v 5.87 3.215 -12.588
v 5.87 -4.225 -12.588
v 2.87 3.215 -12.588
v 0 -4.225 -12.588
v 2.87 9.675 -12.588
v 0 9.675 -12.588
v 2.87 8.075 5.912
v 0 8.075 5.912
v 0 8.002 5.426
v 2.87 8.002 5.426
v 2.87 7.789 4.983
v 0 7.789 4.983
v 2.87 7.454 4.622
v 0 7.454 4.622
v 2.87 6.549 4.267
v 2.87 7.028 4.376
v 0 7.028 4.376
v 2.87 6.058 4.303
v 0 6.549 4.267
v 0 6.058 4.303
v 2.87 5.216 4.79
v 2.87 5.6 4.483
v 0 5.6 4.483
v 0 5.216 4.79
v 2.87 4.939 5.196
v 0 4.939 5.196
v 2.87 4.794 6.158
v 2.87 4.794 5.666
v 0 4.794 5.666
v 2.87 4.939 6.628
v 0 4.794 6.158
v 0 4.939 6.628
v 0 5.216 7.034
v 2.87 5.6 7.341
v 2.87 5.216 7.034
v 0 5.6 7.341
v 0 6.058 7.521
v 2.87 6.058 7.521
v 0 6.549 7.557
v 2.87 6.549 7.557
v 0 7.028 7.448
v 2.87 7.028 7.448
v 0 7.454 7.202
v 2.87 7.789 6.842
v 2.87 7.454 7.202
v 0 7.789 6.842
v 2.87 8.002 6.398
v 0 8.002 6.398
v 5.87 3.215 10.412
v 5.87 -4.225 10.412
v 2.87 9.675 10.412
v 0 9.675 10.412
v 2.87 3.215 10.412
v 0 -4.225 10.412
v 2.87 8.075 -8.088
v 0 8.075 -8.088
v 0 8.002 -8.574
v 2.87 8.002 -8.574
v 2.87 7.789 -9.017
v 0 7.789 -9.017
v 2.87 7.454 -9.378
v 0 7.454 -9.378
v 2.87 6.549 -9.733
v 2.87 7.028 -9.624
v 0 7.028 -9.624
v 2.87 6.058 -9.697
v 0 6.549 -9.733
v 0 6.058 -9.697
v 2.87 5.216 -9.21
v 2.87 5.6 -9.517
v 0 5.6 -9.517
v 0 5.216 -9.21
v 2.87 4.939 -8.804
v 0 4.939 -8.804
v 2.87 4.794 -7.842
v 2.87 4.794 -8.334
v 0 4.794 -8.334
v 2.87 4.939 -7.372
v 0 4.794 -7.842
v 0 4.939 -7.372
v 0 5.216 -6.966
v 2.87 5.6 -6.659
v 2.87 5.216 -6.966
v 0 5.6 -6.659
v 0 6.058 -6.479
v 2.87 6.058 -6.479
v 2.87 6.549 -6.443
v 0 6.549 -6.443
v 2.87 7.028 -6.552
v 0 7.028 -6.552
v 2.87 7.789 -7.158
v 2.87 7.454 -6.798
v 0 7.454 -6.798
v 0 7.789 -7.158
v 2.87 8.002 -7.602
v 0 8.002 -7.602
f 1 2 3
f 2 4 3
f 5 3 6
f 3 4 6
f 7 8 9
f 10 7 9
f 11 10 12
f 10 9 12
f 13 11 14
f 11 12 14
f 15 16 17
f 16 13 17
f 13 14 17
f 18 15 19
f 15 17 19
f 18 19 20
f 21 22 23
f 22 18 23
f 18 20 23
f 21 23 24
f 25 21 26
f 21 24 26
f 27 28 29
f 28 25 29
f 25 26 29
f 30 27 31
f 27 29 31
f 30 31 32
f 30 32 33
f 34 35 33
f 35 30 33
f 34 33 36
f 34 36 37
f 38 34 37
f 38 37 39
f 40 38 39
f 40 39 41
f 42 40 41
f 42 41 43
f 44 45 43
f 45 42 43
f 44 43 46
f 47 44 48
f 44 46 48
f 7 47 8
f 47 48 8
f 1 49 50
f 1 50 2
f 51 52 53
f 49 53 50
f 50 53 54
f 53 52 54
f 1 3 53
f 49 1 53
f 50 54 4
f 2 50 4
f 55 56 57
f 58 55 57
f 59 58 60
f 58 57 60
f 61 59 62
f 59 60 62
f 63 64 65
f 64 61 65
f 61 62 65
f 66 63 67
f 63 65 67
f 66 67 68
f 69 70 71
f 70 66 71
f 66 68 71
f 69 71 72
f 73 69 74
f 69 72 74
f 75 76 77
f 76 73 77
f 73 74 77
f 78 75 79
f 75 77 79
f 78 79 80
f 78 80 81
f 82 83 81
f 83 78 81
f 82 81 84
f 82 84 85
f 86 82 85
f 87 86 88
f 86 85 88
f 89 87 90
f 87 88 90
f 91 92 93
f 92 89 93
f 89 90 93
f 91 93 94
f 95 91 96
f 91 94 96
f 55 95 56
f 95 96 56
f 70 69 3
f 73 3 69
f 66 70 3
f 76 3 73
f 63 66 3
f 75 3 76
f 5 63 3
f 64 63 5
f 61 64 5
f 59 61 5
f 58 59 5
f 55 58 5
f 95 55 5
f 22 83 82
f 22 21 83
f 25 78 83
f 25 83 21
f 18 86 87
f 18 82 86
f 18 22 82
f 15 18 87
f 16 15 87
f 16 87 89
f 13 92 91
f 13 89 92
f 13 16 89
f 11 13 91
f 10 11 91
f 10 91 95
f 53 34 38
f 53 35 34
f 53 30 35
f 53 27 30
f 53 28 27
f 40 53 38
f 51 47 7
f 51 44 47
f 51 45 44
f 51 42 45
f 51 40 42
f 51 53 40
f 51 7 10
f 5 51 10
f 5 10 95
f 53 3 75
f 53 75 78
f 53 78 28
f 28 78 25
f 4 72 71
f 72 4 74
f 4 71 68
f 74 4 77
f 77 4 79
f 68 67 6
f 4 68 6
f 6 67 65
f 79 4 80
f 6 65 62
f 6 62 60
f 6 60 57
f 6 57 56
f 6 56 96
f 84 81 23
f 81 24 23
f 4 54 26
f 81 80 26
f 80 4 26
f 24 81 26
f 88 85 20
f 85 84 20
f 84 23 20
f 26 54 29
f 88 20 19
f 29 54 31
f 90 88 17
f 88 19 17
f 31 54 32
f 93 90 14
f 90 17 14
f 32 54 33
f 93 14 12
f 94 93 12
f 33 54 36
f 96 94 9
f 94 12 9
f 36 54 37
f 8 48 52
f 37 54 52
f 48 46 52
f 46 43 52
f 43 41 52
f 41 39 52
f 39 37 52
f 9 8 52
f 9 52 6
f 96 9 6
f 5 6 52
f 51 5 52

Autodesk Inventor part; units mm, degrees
ref_plane "YZ Plane" through (0, 0, 0) normal (1, 0, 0) x (0, 1, 0)
ref_plane "XZ Plane" through (0, 0, 0) normal (0, 1, 0) x (-1, 0, 0)
ref_plane "XY Plane" through (0, 0, 0) normal (0, 0, 1) x (1, 0, 0)
sketch "Sketch1" plane through (0, 0, 0) normal (1, 0, 0) x (0, 1, 0)
  line L0 (9.6754, 10.4121) -> (-4.2246, 10.4121)
  line L1 (-4.2246, 10.4121) -> (-4.2246, -12.5879)
  line L2 (-4.2246, -12.5879) -> (9.6754, -12.5879)
  line L3 (9.6754, -12.5879) -> (9.6754, 10.4121)
  line L4 (9.6754, -1.0879) -> (8.0754, -1.0879) construction
  line L5 (8.0754, -1.0879) -> (8.0754, -8.0879) construction
  line L6 (8.0754, -8.0879) -> (8.0754, 5.9121) construction
  line L7 (8.0754, 5.9121) -> (6.4254, 5.9121) construction
  circle A0 centre (6.4254, 5.9121) radius 1.65
  circle A1 centre (6.4254, -8.0879) radius 1.65
  point P0 (0, 0)
  dimension "d0" = 13.9
  dimension "d1" = 23
  dimension "d7" = 1.6
  dimension "d8" = 7
  dimension "d9" = 90
  dimension "d10" = 14
  dimension "d11" = 1.65
  dimension "d12" = 3.3
  dimension "d13" = 3.3
extrude "Extrusion1" add sketch "Sketch1" along normal blind 2.87
sketch "Sketch2" plane through (2.87, 0, 0) normal (1, 0, 0) x (0, 0, -1)
  line L0 (12.5879, -4.2246) -> (12.5879, 9.6754) projected
  line L1 (-10.4121, -4.2246) -> (12.5879, -4.2246)
  line L2 (12.5879, -4.2246) -> (12.5879, 3.2154)
  line L3 (12.5879, 3.2154) -> (-10.4121, 3.2154)
  line L4 (-10.4121, 3.2154) -> (-10.4121, -4.2246)
  point P0 (0, 0)
  dimension "d4" = 7.44
extrude "Extrusion2" add sketch "Sketch2" along normal blind 3
properties part number "reed_switch"
